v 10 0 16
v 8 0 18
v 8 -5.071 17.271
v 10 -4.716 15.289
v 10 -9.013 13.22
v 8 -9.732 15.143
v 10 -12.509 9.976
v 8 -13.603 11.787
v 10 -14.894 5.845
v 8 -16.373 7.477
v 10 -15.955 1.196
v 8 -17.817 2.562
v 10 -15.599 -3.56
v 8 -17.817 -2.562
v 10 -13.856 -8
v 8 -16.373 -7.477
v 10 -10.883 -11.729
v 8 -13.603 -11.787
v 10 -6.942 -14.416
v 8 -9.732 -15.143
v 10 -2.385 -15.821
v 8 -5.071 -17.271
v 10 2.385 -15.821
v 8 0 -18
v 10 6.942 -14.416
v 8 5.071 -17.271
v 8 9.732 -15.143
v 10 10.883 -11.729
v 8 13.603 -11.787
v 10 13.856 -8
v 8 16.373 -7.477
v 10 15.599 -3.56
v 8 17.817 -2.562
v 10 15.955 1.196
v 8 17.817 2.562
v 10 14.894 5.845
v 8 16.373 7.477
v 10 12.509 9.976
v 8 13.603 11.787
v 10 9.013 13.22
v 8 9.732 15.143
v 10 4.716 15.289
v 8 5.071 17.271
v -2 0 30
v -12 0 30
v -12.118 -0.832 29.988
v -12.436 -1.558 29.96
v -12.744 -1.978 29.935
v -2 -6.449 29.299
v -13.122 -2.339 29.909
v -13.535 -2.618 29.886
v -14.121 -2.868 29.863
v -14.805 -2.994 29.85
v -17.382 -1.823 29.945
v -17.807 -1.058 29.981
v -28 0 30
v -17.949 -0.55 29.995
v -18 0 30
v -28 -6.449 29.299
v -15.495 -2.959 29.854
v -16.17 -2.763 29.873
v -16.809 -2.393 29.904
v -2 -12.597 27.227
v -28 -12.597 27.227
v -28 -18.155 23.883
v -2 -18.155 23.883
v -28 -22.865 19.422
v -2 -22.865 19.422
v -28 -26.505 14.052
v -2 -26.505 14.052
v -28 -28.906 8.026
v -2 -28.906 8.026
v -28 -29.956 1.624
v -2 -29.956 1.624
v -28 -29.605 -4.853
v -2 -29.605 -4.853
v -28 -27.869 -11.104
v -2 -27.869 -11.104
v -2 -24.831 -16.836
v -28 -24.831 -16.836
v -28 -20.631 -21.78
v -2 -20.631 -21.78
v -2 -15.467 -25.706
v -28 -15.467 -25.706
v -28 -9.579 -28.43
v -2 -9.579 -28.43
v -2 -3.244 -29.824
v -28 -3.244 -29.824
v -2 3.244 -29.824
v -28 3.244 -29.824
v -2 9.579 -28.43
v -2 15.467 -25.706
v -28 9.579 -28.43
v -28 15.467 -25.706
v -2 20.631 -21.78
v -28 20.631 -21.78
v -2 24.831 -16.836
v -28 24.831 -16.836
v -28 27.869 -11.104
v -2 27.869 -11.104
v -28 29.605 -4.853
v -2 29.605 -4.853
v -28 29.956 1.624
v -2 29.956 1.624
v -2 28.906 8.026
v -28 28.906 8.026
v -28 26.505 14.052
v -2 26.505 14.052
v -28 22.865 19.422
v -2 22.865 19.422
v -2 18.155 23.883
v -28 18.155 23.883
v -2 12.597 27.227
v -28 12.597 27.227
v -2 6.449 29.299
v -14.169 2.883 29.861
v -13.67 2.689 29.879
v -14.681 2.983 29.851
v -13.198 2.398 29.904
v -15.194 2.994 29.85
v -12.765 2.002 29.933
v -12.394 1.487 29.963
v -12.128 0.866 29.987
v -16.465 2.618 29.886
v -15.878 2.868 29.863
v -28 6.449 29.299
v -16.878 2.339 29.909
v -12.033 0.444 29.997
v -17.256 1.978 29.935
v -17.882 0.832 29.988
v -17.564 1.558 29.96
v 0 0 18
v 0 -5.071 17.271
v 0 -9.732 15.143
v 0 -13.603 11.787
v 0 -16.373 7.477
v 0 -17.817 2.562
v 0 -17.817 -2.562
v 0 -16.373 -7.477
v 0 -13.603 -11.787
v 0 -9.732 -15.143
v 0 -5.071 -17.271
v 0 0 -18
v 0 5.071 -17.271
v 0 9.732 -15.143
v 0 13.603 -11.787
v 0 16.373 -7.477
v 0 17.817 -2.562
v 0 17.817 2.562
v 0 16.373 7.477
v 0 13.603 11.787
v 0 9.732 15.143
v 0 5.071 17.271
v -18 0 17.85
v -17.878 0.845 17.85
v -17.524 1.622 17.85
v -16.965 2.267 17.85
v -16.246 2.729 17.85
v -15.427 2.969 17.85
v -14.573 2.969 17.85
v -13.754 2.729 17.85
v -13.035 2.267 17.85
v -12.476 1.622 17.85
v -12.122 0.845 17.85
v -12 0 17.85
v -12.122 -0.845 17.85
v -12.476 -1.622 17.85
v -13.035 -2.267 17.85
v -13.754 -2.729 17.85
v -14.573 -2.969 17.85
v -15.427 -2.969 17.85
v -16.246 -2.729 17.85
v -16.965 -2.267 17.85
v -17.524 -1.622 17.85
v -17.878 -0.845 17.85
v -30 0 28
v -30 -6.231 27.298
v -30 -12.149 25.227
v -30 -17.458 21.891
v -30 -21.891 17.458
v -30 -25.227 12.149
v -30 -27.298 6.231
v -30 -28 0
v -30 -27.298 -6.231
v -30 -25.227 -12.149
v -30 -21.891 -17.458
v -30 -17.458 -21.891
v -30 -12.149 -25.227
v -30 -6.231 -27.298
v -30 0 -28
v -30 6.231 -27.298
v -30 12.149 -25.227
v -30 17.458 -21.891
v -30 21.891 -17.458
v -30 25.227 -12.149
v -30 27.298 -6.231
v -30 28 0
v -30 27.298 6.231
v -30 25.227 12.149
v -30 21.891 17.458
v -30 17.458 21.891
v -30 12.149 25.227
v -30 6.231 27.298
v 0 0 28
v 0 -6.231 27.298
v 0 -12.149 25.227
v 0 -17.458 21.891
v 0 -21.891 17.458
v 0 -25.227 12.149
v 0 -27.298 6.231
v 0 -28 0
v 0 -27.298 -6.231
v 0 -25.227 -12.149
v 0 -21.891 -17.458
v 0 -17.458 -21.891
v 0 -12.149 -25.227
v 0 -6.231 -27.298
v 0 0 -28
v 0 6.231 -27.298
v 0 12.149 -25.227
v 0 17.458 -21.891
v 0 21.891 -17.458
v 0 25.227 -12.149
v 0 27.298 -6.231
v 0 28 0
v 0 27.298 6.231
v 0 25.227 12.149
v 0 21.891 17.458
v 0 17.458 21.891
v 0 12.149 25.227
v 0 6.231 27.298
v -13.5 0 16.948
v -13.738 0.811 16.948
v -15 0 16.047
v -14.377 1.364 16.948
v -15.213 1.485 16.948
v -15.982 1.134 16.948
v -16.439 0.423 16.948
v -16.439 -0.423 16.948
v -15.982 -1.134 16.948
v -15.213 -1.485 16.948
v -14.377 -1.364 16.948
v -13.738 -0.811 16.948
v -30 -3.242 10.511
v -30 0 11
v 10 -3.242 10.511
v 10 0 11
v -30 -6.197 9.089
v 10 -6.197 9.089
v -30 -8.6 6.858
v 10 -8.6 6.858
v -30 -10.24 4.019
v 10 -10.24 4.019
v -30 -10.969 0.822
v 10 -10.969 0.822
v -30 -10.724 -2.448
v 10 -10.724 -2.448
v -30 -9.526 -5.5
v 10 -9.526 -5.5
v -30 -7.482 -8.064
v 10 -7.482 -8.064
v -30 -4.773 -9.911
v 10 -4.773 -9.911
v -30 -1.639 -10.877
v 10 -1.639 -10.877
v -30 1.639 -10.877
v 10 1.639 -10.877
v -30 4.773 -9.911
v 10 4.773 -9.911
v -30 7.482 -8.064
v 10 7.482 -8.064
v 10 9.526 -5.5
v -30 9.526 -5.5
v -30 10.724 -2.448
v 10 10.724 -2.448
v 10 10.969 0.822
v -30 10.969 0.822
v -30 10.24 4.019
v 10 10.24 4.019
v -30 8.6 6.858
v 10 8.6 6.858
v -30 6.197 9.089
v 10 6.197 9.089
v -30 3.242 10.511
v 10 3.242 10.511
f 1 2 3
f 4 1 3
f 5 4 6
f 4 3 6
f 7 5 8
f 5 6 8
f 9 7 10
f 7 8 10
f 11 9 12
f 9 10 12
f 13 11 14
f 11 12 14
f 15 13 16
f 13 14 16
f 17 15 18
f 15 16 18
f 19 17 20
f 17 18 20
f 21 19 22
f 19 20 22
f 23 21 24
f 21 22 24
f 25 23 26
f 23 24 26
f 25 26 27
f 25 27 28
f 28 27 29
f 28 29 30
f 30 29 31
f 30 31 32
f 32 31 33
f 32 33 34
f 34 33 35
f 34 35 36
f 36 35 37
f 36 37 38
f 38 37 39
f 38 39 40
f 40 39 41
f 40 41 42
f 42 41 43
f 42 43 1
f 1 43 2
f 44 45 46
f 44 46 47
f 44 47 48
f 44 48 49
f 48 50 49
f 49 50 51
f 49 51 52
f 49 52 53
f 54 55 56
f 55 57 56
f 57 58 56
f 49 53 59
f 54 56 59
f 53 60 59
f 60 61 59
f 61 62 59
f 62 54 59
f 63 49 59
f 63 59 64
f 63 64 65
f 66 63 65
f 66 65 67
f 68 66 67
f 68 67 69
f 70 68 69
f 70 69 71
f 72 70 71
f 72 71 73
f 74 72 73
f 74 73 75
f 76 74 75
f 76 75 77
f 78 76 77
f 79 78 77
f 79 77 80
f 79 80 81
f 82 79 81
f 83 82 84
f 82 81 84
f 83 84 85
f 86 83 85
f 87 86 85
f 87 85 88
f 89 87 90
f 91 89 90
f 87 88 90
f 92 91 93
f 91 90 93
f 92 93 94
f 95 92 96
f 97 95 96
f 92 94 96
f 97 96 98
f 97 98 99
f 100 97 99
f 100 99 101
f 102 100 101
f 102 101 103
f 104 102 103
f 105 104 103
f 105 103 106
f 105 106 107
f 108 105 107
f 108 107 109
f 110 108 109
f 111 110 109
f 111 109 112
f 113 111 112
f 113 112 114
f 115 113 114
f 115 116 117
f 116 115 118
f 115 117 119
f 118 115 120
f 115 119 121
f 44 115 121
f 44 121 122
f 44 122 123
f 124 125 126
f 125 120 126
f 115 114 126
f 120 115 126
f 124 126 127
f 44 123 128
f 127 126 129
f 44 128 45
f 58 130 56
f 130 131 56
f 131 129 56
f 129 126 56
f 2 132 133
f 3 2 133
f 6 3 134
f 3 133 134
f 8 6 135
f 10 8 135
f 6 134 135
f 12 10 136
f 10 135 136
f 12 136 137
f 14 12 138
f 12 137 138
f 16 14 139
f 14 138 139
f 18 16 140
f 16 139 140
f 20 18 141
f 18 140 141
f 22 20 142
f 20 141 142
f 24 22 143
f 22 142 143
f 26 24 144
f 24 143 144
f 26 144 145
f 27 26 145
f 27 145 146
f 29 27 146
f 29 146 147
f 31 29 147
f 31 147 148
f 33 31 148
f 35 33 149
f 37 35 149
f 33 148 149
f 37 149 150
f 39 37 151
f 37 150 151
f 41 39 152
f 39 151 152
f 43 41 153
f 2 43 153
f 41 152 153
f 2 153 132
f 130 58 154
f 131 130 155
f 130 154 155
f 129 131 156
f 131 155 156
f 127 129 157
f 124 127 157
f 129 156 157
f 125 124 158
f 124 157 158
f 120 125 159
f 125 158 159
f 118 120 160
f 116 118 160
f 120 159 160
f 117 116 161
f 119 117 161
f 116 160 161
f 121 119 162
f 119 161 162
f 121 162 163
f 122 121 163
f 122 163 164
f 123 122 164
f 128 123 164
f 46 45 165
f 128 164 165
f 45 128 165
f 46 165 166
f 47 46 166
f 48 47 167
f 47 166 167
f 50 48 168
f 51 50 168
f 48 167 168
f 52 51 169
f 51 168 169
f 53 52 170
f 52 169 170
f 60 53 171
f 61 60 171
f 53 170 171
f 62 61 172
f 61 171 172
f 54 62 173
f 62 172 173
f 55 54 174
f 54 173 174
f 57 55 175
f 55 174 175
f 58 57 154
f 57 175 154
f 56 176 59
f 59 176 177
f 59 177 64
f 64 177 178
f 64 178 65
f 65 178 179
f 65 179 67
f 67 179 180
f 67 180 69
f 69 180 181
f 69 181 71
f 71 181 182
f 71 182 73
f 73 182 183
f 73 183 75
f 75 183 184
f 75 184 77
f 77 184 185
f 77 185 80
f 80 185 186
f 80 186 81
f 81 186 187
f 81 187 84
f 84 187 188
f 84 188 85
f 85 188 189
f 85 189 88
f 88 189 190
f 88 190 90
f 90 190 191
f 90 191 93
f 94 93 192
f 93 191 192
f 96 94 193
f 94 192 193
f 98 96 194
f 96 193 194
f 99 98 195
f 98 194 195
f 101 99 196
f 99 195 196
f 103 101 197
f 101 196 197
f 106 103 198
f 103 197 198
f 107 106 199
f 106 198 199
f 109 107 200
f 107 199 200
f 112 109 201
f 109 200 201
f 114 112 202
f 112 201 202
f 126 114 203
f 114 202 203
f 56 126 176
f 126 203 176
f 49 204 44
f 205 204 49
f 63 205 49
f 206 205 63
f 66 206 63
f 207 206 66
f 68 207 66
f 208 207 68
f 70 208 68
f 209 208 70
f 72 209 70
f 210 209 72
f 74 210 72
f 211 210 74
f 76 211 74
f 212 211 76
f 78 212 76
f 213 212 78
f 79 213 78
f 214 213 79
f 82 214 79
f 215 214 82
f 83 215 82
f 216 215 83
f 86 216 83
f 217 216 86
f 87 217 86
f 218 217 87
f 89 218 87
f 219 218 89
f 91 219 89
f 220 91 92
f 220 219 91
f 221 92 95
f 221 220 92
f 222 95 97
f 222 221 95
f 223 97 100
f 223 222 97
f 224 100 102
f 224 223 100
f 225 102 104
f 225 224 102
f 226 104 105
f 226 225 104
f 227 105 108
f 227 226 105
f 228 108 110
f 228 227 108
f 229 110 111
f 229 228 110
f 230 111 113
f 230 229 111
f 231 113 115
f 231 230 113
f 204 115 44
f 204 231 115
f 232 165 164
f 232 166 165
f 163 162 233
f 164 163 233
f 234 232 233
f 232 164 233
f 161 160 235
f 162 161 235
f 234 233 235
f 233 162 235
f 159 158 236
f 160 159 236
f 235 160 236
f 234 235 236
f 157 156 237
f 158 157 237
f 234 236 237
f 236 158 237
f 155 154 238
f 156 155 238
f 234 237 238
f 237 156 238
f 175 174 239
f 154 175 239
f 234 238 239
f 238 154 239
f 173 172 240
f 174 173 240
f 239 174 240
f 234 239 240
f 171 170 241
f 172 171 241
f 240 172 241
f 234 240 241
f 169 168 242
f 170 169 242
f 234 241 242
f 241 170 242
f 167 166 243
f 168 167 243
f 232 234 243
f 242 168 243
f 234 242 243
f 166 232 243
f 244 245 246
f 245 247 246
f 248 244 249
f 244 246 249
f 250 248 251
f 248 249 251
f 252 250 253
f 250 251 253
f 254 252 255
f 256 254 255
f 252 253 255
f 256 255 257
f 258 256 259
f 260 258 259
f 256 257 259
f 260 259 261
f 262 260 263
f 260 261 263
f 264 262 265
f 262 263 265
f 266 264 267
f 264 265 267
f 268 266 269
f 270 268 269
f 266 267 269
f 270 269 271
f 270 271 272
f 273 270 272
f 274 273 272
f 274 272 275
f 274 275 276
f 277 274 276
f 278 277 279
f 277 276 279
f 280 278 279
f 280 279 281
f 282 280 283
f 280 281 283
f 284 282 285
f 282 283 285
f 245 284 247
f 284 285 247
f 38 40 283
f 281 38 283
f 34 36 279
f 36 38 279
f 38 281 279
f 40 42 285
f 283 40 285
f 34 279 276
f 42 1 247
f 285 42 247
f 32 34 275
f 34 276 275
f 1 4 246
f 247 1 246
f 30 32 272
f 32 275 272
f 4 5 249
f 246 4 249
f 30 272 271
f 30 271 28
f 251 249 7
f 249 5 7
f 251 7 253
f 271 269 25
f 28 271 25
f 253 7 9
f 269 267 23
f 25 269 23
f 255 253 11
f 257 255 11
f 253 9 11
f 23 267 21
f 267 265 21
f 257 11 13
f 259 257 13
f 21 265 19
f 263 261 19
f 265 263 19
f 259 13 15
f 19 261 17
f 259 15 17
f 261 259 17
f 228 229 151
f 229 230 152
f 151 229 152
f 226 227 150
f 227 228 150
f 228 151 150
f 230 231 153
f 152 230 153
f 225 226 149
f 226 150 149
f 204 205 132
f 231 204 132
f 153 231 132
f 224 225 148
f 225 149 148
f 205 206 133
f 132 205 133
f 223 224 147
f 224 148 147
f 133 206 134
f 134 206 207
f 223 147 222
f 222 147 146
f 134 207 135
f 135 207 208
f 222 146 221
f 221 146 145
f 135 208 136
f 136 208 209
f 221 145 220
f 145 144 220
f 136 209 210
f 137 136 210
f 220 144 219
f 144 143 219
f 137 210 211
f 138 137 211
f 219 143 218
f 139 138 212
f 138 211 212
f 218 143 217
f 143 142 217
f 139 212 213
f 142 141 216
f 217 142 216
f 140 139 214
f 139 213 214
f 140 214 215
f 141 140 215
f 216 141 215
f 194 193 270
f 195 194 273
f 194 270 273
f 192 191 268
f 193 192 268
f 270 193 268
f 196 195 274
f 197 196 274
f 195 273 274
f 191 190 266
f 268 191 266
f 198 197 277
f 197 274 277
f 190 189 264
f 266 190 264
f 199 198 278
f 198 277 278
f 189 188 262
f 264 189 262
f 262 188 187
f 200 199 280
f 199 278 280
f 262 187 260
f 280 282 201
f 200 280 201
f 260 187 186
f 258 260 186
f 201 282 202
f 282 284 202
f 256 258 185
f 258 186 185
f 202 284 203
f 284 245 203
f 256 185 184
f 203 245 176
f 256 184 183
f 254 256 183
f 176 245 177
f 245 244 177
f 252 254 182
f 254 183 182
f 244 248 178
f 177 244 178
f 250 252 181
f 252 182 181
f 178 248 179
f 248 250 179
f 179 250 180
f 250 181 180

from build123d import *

# Parameters (mm, degrees)
F2_SIZE  = 2
F5_D     = 6
F5_DEPTH = 12
F5_START = 0.150377
F5_TIP   = 1.8025818571


with BuildPart() as f1:
    # F0 (on Front) → F1 (revolve)
    with BuildSketch(Plane.XZ):
        Polygon((0, 30), (-30, 30), (-30, 11), (10, 11), (10, 18), (0, 18), align=None)
    revolve(axis=Axis((3.7253e-06, 0, 0), (1, 0, 0)))

    # F2
    f2_edges = [f1.edges().sort_by_distance(p)[0] for p in [
        (0, 0, -30),
        (-30, 0, -30),
        (-15, 0, 30),
        (10, 0, -18),
    ]]
    chamfer(f2_edges, length=F2_SIZE)

    # F5
    # its depths count from where the whole tool has entered the part; down to there all is cleared
    with Locations(Plane.XY.offset(30).offset(-F5_START)):
        with Locations((-15, 0)):
            Hole(F5_D / 2, depth=F5_DEPTH)
            with Locations((0, 0, -(F5_DEPTH + F5_TIP / 2))):  # 118° drill point
                Cone(0, F5_D / 2, F5_TIP, mode=Mode.SUBTRACT)


solid = f1.part
